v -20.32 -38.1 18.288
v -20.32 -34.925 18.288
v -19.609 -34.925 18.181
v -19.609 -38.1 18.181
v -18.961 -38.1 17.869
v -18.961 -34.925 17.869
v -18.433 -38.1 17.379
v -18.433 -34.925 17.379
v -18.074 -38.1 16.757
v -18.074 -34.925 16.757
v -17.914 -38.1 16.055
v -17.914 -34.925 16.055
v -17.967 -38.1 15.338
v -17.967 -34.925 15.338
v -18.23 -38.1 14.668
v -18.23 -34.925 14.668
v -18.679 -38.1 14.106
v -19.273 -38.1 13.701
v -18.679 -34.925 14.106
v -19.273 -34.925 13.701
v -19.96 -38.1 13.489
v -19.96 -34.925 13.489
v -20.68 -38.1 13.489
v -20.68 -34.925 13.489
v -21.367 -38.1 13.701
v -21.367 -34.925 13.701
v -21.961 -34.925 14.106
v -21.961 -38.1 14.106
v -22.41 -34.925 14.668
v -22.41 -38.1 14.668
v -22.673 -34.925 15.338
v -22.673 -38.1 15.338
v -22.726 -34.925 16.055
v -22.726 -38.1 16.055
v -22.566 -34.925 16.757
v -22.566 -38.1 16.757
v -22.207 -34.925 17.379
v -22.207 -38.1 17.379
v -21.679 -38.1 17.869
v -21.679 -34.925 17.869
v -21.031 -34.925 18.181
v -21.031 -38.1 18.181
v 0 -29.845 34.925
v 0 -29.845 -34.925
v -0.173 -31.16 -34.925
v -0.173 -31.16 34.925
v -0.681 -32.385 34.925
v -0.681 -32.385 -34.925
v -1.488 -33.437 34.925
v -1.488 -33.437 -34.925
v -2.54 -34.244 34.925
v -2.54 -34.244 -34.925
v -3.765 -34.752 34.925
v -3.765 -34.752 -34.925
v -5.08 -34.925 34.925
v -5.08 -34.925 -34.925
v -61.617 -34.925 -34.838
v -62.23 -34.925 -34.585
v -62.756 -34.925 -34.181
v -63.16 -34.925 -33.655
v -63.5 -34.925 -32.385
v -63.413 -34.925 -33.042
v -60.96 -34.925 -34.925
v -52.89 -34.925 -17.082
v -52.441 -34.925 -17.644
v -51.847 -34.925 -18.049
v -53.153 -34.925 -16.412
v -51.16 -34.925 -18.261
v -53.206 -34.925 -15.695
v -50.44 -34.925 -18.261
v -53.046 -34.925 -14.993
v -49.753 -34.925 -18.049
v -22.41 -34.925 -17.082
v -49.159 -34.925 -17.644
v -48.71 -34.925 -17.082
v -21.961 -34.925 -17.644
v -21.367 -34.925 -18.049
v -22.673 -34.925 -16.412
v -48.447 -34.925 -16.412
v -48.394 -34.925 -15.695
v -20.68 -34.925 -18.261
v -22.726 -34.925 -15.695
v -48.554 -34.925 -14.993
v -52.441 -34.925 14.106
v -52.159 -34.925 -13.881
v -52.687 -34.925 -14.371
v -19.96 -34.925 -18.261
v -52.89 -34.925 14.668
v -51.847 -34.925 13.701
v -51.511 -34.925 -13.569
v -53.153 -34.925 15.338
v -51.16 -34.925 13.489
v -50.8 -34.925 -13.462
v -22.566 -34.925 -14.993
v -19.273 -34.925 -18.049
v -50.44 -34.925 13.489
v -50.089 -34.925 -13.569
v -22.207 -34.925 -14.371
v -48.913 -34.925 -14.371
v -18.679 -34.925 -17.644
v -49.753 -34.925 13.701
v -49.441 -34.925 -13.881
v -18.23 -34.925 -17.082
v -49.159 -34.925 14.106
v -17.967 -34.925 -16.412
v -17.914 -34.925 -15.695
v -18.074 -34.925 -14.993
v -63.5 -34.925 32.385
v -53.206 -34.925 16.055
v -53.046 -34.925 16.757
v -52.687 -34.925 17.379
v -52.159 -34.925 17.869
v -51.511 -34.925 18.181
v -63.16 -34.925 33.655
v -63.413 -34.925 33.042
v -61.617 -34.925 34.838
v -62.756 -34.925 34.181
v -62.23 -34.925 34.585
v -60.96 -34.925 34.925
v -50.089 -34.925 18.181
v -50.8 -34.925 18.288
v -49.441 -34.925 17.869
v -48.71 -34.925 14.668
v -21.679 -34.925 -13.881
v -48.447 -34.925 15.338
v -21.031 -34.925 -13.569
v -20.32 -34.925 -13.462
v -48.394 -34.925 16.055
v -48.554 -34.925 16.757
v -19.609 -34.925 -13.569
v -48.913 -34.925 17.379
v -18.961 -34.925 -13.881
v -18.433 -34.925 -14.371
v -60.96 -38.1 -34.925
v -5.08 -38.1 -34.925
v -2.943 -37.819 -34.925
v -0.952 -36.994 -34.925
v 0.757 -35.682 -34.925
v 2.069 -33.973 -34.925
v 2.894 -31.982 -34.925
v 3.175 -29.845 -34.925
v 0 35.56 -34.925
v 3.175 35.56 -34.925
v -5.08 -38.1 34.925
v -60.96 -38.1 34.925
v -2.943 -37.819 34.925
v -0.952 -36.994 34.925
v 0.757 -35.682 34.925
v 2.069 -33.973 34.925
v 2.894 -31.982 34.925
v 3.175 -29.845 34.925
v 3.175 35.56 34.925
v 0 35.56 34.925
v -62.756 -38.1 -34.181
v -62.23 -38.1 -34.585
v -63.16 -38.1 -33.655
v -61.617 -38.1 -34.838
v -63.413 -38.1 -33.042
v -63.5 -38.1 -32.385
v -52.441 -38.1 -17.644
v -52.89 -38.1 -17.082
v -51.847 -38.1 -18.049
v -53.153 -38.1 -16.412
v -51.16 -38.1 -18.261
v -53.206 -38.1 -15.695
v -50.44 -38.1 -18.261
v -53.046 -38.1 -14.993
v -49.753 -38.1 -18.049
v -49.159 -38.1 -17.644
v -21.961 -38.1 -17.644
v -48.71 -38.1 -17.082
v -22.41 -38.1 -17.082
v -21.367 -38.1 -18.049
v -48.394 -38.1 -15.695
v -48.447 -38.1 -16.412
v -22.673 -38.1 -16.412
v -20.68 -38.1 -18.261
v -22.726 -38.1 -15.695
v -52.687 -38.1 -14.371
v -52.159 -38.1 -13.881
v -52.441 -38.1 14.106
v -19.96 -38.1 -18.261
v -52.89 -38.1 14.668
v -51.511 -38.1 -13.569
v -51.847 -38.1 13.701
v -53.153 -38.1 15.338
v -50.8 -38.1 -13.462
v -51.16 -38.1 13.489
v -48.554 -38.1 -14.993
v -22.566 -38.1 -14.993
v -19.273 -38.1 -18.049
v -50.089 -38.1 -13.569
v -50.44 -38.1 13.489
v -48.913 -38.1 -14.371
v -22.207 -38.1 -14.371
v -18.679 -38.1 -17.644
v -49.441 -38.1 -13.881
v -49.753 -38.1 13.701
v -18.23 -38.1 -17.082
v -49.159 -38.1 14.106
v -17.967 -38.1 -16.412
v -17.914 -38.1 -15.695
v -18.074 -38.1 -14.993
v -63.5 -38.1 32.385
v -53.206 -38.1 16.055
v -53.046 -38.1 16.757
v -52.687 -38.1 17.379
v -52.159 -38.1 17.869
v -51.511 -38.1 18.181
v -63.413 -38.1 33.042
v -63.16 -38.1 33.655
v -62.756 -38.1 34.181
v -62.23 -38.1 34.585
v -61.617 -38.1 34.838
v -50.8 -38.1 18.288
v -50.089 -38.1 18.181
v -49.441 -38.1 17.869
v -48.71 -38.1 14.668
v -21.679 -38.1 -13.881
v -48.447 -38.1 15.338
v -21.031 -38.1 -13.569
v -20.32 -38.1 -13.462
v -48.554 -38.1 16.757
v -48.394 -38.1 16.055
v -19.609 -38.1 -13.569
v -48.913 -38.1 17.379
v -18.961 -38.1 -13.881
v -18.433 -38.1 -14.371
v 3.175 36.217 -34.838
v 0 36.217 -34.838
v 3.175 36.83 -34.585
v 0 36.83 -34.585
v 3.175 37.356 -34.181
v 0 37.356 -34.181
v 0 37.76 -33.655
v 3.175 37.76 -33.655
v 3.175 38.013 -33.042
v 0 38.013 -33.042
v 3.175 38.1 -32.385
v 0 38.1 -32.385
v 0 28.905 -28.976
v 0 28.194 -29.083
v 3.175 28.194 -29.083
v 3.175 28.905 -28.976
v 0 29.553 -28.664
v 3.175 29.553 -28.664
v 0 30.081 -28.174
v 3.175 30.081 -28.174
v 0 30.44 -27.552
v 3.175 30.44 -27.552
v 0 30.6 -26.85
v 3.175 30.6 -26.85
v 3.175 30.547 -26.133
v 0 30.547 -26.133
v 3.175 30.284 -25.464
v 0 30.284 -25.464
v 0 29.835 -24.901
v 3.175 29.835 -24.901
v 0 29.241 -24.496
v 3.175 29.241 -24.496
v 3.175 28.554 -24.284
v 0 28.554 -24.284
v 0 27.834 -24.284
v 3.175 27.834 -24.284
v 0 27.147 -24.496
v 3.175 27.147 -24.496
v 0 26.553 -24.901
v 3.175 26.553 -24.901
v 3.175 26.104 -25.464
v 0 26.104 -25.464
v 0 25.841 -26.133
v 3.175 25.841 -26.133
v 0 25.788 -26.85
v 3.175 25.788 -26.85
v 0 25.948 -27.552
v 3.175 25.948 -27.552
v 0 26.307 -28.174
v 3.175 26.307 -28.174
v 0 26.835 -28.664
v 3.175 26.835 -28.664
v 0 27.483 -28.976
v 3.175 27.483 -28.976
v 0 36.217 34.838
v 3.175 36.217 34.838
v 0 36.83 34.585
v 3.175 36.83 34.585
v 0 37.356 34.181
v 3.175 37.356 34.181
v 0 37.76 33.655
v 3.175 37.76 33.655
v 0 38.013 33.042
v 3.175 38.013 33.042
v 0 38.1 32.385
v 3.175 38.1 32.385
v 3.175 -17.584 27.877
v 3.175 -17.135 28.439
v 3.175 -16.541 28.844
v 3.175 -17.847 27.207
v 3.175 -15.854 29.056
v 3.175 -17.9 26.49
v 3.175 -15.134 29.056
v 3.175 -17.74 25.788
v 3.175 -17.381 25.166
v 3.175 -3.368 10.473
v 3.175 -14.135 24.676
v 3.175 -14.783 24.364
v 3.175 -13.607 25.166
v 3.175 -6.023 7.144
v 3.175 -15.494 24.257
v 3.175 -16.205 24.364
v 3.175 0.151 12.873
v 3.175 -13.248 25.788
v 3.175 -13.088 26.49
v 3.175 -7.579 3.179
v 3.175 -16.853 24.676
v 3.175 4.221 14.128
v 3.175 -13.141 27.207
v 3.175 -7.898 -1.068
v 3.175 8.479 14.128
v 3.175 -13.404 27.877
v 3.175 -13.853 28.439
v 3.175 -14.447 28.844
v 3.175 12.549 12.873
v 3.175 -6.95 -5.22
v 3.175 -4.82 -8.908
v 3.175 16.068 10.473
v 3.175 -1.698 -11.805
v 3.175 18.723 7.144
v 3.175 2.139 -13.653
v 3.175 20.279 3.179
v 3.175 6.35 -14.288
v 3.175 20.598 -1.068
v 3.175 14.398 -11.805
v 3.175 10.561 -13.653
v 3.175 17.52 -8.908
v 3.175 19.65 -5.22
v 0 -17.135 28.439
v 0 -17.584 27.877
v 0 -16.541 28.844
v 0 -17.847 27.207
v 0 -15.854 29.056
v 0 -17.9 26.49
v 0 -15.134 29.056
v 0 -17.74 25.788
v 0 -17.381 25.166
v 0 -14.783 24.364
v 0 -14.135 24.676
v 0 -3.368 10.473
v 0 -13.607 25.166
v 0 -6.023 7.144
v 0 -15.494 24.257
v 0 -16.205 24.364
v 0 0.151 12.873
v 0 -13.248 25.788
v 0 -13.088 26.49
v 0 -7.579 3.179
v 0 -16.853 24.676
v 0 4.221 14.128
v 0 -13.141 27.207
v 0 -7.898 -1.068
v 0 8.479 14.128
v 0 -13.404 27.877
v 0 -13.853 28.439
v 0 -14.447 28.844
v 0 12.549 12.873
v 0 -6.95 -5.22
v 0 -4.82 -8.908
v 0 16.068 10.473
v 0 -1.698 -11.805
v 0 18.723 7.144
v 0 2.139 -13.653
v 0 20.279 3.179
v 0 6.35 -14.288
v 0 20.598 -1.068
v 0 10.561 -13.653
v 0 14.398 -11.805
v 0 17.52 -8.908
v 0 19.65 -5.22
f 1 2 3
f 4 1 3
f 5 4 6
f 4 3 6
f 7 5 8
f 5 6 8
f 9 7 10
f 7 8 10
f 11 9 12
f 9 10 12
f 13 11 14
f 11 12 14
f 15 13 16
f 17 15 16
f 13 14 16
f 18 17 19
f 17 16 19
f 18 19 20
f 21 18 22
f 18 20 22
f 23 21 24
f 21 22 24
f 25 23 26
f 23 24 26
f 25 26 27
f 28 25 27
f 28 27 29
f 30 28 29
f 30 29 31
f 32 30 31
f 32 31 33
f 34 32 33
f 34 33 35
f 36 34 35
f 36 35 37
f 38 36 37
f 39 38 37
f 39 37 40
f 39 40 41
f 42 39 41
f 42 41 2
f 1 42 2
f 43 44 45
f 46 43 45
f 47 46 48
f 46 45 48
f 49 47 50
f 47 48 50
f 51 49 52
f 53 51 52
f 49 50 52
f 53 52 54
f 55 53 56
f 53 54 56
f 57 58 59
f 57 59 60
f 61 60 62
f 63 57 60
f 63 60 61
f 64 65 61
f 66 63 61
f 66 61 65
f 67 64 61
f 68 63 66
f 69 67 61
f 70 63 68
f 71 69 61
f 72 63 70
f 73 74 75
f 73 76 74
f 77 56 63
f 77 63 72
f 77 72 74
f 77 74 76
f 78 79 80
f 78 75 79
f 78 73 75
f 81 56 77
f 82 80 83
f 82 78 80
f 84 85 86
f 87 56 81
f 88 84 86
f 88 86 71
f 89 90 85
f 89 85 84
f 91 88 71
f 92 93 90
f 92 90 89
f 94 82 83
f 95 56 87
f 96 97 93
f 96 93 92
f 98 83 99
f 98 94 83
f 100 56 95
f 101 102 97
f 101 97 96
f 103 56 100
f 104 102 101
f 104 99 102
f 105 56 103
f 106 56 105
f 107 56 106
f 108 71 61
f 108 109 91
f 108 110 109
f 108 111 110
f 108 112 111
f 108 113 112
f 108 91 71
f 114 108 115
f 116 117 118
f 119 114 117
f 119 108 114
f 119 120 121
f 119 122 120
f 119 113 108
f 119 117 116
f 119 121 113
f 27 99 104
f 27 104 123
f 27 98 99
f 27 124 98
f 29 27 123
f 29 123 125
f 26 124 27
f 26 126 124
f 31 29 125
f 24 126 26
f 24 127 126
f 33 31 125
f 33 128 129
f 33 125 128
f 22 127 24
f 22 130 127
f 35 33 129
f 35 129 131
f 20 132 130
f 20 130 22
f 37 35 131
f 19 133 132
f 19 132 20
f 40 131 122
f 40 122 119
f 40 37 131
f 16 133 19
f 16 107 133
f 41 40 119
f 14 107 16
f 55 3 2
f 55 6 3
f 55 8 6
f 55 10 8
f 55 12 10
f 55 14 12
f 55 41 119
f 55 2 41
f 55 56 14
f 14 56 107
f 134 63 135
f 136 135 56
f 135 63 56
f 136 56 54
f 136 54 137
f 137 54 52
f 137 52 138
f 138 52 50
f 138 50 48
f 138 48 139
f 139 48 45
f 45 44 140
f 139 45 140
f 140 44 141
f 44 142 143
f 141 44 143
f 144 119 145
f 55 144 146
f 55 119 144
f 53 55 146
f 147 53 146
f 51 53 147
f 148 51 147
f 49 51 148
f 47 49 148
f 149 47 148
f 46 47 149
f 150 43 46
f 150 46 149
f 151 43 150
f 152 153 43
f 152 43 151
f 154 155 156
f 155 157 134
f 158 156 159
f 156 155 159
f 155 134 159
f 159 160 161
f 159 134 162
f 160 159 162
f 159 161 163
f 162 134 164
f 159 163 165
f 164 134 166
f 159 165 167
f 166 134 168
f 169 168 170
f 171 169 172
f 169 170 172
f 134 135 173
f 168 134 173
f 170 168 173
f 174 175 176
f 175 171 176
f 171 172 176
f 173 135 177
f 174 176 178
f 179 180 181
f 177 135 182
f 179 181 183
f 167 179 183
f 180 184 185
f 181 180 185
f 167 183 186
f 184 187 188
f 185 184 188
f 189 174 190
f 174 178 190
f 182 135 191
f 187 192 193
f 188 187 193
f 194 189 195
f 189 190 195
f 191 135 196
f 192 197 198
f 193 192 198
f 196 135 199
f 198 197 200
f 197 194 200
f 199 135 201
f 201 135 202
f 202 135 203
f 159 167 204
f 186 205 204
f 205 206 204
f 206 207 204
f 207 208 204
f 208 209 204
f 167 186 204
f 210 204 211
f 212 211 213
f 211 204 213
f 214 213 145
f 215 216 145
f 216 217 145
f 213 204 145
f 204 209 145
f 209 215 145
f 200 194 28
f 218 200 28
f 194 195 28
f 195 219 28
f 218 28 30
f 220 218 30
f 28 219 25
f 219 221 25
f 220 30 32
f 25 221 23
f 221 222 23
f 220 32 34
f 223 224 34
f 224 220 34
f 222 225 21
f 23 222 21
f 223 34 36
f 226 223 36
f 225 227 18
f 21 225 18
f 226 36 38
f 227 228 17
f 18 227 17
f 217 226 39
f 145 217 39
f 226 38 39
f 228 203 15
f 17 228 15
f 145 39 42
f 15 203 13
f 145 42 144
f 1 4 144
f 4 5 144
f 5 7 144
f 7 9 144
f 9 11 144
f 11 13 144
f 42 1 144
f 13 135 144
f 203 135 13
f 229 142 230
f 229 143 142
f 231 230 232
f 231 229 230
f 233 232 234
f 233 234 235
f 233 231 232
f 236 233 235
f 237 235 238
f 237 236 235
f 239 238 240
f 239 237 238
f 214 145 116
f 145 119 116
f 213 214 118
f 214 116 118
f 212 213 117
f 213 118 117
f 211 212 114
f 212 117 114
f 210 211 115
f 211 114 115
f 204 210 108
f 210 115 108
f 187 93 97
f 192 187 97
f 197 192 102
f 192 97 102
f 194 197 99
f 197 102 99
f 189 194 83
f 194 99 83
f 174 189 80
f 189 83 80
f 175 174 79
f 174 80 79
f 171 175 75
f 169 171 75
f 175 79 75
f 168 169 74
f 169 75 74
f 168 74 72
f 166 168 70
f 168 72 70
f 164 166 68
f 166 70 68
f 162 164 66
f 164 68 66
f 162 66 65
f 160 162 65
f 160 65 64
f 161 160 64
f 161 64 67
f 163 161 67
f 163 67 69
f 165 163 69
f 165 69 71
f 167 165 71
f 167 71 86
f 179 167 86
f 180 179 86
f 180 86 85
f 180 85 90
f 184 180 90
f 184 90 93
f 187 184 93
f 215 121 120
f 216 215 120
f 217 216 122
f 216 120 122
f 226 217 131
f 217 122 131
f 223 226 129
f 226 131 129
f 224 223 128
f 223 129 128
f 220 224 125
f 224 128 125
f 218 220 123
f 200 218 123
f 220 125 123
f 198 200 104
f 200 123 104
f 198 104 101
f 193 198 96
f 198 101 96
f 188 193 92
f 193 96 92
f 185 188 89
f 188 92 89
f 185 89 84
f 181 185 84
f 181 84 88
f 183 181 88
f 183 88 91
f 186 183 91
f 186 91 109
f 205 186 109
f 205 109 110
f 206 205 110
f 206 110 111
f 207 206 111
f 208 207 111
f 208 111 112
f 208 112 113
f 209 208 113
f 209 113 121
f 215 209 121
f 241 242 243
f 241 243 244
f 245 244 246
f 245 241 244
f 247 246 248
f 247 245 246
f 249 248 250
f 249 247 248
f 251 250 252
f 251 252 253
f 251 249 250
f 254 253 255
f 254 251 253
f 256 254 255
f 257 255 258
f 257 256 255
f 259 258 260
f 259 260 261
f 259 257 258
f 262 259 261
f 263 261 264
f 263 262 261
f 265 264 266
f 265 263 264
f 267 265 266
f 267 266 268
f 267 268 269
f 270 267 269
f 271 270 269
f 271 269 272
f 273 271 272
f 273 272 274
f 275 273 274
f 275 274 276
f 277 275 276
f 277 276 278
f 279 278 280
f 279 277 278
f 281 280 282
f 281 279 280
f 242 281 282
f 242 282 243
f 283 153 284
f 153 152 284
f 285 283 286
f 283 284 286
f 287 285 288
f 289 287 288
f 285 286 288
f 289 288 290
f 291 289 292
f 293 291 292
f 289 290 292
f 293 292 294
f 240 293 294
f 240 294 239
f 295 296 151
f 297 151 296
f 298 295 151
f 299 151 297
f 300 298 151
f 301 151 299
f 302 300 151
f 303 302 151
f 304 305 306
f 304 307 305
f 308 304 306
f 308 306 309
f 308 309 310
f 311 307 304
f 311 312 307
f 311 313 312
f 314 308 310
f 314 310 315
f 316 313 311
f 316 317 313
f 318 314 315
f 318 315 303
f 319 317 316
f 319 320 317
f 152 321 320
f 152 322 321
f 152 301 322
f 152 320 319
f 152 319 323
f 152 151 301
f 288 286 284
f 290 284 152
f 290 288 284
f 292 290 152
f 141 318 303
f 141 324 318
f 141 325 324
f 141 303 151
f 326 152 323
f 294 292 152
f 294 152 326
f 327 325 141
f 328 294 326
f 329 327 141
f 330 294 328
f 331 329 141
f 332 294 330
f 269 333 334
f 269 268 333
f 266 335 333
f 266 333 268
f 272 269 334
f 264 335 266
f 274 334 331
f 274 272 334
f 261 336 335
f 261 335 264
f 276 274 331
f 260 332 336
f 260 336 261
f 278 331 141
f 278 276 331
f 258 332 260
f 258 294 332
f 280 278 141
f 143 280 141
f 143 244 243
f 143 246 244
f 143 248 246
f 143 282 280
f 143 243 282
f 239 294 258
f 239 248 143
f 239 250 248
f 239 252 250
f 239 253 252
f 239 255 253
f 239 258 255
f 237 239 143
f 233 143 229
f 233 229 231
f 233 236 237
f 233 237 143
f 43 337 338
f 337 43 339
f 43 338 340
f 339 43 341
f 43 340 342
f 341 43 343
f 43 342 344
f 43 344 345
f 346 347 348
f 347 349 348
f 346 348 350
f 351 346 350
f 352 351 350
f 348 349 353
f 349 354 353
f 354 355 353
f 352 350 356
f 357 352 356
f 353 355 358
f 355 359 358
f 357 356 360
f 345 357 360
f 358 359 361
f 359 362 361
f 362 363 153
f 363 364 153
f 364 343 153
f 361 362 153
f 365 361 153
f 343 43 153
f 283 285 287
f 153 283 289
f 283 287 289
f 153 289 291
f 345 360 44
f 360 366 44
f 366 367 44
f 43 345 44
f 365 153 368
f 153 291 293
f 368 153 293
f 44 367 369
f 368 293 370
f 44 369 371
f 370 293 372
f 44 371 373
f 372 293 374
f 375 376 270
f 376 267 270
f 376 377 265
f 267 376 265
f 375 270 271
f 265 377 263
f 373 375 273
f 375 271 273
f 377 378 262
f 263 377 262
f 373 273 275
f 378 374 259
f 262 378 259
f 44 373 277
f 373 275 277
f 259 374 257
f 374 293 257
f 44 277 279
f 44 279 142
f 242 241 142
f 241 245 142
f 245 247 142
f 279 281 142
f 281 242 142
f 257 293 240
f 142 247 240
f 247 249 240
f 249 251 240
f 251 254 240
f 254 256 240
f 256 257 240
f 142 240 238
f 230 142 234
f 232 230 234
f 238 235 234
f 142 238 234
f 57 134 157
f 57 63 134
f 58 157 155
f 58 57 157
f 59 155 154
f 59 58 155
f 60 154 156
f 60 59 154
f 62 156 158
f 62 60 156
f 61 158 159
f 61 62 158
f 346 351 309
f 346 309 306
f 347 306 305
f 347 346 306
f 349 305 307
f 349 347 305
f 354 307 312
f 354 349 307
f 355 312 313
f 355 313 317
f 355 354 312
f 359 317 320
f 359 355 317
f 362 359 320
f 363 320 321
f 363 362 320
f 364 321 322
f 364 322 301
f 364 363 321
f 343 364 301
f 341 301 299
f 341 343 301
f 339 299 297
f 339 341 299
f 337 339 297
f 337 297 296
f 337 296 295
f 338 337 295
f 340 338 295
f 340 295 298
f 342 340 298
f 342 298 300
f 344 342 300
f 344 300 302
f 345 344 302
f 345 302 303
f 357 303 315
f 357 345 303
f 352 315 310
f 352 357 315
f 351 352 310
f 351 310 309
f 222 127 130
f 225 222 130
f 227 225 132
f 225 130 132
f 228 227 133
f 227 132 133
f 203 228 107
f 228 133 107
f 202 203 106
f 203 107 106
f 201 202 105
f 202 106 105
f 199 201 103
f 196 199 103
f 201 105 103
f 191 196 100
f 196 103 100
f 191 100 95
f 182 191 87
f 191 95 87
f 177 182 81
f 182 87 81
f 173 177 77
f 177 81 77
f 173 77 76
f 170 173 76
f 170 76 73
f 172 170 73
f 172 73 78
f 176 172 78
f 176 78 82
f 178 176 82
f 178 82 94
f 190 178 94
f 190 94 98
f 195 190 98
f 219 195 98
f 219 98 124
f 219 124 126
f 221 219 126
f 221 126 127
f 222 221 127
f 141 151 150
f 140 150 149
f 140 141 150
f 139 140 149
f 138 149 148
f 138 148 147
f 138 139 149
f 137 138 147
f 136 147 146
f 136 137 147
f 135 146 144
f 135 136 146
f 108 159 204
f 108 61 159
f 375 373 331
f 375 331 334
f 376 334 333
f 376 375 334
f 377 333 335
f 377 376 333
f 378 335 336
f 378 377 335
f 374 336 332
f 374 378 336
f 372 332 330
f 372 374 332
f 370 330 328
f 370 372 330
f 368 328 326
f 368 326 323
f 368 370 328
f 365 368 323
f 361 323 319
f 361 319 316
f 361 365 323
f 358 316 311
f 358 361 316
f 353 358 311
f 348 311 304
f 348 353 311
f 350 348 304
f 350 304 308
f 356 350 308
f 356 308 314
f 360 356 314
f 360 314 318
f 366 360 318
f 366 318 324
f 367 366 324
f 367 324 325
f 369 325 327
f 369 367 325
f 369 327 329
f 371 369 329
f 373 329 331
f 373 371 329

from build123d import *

# Parameters (mm, degrees)
SKETCH1_W              = 69.85
SKETCH1_H              = 76.2
SKETCH1_R              = 14.2875
SKETCH1_R_2            = 2.413
BOSS_EXTRUDE1_DEPTH    = 3.175
SKETCH2_W              = 69.85
SKETCH2_H              = 3.175
BOSS_EXTRUDE2_DEPTH    = 63.5
CONVERT_SOLID1_START   = -34.925
CONVERT_SOLID1_DEPTH   = 69.85
CONVERT_SOLID1_2_DEPTH = 69.85
FILLET1_R              = 2.54
SKETCH7_R              = 2.413
CUT_EXTRUDE1_DEPTH     = 103.881758587


# Read off the part's stored shape, not the designer's step: Convert-Solid1
with BuildPart() as part:
    # Sketch1 → Boss-Extrude1 (new body)
    with BuildSketch(Plane(origin=(0, 0, 0), x_dir=(0, 0, -1), z_dir=(1, 0, 0))):
        Rectangle(SKETCH1_W, SKETCH1_H)
        with Locations((0, 6.35)):
            Circle(SKETCH1_R, mode=Mode.SUBTRACT)
        with Locations((26.67, 28.194)):
            Circle(SKETCH1_R_2, mode=Mode.SUBTRACT)
        with Locations((-26.67, -15.494)):
            Circle(SKETCH1_R_2, mode=Mode.SUBTRACT)
    extrude(amount=BOSS_EXTRUDE1_DEPTH)

    # Sketch2 → Boss-Extrude2 (add)
    with BuildSketch(Plane.ZY):
        with Locations((0, -36.5125)):
            Rectangle(SKETCH2_W, SKETCH2_H)
    extrude(amount=BOSS_EXTRUDE2_DEPTH)

    # Convert-Solid1 outline → Convert-Solid1 (cut)
    with BuildSketch(Plane.XY.offset(CONVERT_SOLID1_START)):
        with BuildLine():
            Line((3.175, -38.1), (3.175, -29.845))
            ThreePointArc((3.175, -29.845), (0.757166479, -35.682166479), (-5.08, -38.1))
            Line((-5.08, -38.1), (3.175, -38.1))
        make_face()
    extrude(amount=CONVERT_SOLID1_DEPTH, mode=Mode.SUBTRACT)

    # Convert-Solid1 2 outline → Convert-Solid1 2 (add)
    with BuildSketch(Plane.XY.offset(CONVERT_SOLID1_START)):
        with BuildLine():
            Line((0, -34.925), (0, -29.845))
            ThreePointArc((0, -29.845), (-1.487897552, -33.437102448), (-5.08, -34.925))
            Line((-5.08, -34.925), (0, -34.925))
        make_face()
    extrude(amount=CONVERT_SOLID1_2_DEPTH)

    # Fillet1
    fillet1_edges = [part.edges().sort_by_distance(p)[0] for p in [
        (1.5875, 38.1, -34.925),
        (1.5875, 38.1, 34.925),
        (-63.5, -36.5125, 34.925),
        (-63.5, -36.5125, -34.925),
    ]]
    fillet(fillet1_edges, radius=FILLET1_R)

    # Sketch7 → Cut-Extrude1 (cut, through all)
    with BuildSketch(Plane(origin=(0, -34.925, 0), x_dir=(1, 0, 0), z_dir=(0, 1, 0))):
        with Locations(Location((-50.8, 15.875, 0), (0, 0, 270))):
            Circle(SKETCH7_R)
        with Locations(Location((-20.32, 15.875, 0), (0, 0, 270))):
            Circle(SKETCH7_R)
        with Locations(Location((-50.8, -15.875, 0), (0, 0, 270))):
            Circle(SKETCH7_R)
        with Locations(Location((-20.32, -15.875, 0), (0, 0, 270))):
            Circle(SKETCH7_R)
    extrude(amount=-CUT_EXTRUDE1_DEPTH, mode=Mode.SUBTRACT)


solid = part.part
